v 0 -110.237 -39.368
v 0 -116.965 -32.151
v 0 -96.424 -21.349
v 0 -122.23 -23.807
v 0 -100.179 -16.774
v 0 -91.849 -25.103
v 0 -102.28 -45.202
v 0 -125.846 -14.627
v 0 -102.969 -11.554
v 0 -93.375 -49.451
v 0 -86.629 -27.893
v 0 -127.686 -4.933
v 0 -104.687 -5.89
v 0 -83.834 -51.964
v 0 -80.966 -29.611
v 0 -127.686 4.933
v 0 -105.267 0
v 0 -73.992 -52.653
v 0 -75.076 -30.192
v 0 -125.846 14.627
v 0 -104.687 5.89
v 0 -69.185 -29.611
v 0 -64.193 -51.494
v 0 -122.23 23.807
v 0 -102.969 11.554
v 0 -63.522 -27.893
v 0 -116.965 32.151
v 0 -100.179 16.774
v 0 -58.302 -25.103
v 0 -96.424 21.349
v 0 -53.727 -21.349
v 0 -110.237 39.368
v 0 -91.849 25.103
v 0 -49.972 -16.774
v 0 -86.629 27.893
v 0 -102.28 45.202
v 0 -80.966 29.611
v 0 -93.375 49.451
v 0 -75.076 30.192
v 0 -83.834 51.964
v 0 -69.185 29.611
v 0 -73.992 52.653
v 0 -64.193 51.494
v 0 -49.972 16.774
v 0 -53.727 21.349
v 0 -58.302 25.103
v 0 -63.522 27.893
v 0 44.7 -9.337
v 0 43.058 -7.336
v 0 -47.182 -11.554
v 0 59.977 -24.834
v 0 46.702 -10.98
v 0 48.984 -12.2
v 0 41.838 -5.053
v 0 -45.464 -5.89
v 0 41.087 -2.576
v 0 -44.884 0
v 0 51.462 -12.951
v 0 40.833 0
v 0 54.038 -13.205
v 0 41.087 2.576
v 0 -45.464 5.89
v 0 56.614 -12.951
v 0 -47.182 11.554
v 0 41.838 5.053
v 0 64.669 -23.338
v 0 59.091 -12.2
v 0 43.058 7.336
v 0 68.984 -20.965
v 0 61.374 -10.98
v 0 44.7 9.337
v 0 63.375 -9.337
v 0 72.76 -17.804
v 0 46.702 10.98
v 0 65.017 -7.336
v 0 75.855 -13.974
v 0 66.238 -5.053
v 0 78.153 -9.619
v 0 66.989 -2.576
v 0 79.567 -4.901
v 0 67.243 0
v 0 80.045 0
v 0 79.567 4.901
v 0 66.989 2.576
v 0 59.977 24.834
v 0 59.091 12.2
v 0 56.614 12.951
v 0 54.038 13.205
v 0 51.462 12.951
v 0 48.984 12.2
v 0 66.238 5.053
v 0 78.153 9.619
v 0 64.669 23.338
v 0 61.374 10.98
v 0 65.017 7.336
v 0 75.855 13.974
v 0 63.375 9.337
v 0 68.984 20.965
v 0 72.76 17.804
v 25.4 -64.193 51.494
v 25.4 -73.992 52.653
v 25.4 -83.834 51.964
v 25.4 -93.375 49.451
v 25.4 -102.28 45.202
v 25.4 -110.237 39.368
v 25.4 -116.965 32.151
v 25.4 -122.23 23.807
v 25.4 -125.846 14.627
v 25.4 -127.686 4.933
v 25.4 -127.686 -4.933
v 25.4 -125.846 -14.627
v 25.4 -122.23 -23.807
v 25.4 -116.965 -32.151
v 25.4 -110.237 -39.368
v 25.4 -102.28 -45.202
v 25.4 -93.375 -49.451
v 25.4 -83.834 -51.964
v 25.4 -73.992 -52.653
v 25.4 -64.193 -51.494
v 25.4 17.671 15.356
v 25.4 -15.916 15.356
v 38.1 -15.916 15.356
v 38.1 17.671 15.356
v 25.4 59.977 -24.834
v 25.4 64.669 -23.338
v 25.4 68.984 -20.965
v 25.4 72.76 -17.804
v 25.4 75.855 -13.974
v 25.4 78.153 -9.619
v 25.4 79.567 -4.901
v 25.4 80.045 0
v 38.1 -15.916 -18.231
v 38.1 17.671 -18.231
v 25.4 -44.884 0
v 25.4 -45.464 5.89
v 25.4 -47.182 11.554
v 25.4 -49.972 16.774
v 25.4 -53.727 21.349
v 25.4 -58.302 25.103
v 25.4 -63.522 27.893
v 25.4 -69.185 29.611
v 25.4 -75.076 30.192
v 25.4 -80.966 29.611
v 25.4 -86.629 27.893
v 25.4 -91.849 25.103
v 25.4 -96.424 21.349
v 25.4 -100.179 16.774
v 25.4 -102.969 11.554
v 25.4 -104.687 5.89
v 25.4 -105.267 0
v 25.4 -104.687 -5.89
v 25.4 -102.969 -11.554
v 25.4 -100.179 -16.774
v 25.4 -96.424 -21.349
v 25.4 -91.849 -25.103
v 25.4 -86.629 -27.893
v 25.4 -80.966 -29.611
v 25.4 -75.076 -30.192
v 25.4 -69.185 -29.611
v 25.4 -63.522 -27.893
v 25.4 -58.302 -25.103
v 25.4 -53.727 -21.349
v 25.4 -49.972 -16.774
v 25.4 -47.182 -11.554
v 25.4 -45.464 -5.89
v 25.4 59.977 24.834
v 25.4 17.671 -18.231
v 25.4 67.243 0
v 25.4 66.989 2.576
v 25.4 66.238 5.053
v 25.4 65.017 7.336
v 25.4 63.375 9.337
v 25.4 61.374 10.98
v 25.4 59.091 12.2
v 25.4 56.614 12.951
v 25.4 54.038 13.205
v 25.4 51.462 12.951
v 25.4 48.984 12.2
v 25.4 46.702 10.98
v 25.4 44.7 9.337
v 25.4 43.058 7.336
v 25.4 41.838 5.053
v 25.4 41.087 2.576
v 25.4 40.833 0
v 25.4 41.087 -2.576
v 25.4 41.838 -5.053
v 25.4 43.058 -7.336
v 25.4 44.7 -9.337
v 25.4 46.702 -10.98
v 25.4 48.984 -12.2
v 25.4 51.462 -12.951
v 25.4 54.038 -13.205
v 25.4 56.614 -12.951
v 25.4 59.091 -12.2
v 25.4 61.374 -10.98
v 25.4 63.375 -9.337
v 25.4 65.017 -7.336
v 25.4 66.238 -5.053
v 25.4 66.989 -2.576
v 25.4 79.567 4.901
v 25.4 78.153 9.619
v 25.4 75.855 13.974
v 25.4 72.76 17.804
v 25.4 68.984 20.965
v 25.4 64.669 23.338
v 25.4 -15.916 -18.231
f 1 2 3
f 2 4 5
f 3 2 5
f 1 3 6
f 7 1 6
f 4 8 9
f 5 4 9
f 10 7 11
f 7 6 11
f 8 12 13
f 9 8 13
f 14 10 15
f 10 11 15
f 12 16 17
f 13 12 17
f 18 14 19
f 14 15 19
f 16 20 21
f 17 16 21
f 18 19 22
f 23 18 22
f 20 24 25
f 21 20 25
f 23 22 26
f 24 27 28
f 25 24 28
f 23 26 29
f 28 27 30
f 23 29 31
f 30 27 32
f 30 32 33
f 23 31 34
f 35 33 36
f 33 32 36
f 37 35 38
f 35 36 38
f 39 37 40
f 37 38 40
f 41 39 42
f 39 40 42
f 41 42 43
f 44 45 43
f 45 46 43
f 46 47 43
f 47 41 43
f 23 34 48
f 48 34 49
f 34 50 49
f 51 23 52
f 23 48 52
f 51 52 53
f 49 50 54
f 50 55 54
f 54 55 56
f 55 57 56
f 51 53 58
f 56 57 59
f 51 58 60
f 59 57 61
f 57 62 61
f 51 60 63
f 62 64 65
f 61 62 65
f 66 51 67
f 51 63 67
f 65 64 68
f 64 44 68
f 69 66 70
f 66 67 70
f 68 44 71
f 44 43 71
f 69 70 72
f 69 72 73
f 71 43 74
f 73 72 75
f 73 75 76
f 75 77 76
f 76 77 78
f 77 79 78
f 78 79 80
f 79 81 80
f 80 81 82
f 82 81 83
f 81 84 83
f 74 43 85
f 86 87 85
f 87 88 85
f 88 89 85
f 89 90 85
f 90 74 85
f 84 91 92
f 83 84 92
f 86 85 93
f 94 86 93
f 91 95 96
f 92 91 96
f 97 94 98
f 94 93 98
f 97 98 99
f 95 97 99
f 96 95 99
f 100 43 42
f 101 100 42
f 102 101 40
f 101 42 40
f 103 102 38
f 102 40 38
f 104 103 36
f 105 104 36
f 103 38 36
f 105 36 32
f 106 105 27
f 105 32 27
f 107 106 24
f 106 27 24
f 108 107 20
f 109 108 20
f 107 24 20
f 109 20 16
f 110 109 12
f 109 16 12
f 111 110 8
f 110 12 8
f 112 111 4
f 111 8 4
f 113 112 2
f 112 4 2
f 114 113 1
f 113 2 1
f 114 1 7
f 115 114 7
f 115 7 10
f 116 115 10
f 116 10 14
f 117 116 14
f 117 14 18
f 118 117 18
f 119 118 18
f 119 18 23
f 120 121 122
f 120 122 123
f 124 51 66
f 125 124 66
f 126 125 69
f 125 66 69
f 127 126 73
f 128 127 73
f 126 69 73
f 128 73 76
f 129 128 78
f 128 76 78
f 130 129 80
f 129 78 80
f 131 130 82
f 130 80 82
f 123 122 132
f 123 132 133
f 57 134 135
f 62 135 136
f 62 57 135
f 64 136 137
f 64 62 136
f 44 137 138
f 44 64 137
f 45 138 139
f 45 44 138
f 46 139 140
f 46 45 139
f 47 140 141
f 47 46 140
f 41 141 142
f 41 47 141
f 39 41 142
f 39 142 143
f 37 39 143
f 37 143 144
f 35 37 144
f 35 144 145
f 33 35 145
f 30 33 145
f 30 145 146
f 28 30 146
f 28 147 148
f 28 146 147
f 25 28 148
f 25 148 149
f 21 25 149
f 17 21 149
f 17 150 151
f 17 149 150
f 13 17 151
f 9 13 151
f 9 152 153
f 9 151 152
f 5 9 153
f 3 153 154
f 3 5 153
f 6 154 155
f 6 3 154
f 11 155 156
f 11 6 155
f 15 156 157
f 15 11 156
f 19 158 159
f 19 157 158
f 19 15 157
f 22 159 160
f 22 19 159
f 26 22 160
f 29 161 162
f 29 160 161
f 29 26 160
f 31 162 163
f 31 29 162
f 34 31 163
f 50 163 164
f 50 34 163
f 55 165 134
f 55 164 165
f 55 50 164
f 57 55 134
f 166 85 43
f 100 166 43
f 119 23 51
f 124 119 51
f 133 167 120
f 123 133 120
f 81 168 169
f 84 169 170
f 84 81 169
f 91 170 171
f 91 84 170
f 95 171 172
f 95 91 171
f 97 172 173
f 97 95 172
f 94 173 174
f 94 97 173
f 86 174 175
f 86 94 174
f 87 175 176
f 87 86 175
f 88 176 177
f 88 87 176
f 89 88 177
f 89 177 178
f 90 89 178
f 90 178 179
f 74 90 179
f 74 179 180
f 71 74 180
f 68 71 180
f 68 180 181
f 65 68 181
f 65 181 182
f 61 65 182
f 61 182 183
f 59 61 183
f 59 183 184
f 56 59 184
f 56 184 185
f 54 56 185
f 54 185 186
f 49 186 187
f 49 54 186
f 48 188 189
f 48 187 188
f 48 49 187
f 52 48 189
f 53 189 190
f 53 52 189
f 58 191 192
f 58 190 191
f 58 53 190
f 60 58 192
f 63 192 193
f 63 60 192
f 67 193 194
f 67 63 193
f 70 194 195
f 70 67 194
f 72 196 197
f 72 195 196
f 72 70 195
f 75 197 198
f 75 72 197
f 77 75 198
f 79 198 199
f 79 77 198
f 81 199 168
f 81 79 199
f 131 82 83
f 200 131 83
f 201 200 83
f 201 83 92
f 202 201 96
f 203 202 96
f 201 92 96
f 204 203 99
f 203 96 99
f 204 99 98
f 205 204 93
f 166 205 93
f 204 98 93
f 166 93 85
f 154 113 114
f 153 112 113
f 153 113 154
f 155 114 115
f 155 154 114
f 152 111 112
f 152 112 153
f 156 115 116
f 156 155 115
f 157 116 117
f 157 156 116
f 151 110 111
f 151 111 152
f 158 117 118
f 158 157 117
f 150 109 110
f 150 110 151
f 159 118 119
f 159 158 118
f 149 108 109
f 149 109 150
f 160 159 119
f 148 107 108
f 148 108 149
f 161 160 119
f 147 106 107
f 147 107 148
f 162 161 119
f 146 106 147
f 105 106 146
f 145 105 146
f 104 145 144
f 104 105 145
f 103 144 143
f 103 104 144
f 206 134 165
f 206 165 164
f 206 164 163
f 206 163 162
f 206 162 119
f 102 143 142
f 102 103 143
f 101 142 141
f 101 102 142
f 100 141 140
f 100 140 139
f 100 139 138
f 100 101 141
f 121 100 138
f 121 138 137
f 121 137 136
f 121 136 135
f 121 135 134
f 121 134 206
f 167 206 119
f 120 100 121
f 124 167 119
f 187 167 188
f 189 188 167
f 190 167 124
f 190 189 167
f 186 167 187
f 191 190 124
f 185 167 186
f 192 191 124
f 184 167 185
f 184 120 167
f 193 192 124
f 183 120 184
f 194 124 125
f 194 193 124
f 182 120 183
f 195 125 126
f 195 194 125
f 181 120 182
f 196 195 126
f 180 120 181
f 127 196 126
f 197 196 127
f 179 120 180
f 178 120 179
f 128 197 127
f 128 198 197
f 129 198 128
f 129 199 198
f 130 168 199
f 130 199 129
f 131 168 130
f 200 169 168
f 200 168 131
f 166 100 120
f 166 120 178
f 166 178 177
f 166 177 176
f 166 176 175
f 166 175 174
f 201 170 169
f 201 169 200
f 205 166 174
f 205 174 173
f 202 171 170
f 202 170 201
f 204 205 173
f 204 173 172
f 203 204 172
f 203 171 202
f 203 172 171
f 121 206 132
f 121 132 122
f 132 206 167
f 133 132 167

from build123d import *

# Parameters (mm, degrees)
F1_DEPTH = 25.4
F2_R     = 30.191545
F2_R_2   = 13.204956
F3_DEPTH = 46.73447
F4_W     = 33.58691
F4_H     = 33.58691
F5_DEPTH = 38.1


with BuildPart() as f1:
    # F0 (on Right) → F1 (new body)
    with BuildSketch(Plane.YZ):
        with BuildLine():
            ThreePointArc((-64.193385, -51.494292), (-34.284922, -33.102834), (-22.581748, 0))
            ThreePointArc((-22.581748, 0), (-34.284922, 33.102834), (-64.193385, 51.494292))
            ThreePointArc((-64.193385, 51.494292), (-127.917436, 0), (-64.193385, -51.494292))
        make_face()
        with BuildLine():
            ThreePointArc((-64.193385, 51.494292), (-34.284922, 33.102834), (-22.581748, 0))
            ThreePointArc((-22.581748, 0), (-34.284922, -33.102834), (-64.193385, -51.494292))
            Line((-64.193385, -51.494292), (59.976784, -24.834034))
            ThreePointArc((59.976784, -24.834034), (29.244732, 0), (59.976784, 24.834034))
            Line((59.976784, 24.834034), (-64.193385, 51.494292))
        make_face()
        with BuildLine():
            ThreePointArc((80.044732, 0), (74.400669, 15.964427), (59.976784, 24.834034))
            ThreePointArc((59.976784, 24.834034), (29.244732, 0), (59.976784, -24.834034))
            ThreePointArc((59.976784, -24.834034), (74.400669, -15.964427), (80.044732, 0))
        make_face()
    extrude(amount=F1_DEPTH)

    # F2 (on Right) → F3 (cut)
    with BuildSketch(Plane.YZ):
        with Locations((-75.075522, 0)):
            Circle(F2_R)
        with Locations((54.037802, 0)):
            Circle(F2_R_2)
    extrude(amount=F3_DEPTH, mode=Mode.SUBTRACT)

    # F4 (on Right) → F5 (join)
    with BuildSketch(Plane.YZ):
        with Locations((0.87742, -1.43759)):
            Rectangle(F4_W, F4_H)
    extrude(amount=F5_DEPTH)


solid = f1.part
